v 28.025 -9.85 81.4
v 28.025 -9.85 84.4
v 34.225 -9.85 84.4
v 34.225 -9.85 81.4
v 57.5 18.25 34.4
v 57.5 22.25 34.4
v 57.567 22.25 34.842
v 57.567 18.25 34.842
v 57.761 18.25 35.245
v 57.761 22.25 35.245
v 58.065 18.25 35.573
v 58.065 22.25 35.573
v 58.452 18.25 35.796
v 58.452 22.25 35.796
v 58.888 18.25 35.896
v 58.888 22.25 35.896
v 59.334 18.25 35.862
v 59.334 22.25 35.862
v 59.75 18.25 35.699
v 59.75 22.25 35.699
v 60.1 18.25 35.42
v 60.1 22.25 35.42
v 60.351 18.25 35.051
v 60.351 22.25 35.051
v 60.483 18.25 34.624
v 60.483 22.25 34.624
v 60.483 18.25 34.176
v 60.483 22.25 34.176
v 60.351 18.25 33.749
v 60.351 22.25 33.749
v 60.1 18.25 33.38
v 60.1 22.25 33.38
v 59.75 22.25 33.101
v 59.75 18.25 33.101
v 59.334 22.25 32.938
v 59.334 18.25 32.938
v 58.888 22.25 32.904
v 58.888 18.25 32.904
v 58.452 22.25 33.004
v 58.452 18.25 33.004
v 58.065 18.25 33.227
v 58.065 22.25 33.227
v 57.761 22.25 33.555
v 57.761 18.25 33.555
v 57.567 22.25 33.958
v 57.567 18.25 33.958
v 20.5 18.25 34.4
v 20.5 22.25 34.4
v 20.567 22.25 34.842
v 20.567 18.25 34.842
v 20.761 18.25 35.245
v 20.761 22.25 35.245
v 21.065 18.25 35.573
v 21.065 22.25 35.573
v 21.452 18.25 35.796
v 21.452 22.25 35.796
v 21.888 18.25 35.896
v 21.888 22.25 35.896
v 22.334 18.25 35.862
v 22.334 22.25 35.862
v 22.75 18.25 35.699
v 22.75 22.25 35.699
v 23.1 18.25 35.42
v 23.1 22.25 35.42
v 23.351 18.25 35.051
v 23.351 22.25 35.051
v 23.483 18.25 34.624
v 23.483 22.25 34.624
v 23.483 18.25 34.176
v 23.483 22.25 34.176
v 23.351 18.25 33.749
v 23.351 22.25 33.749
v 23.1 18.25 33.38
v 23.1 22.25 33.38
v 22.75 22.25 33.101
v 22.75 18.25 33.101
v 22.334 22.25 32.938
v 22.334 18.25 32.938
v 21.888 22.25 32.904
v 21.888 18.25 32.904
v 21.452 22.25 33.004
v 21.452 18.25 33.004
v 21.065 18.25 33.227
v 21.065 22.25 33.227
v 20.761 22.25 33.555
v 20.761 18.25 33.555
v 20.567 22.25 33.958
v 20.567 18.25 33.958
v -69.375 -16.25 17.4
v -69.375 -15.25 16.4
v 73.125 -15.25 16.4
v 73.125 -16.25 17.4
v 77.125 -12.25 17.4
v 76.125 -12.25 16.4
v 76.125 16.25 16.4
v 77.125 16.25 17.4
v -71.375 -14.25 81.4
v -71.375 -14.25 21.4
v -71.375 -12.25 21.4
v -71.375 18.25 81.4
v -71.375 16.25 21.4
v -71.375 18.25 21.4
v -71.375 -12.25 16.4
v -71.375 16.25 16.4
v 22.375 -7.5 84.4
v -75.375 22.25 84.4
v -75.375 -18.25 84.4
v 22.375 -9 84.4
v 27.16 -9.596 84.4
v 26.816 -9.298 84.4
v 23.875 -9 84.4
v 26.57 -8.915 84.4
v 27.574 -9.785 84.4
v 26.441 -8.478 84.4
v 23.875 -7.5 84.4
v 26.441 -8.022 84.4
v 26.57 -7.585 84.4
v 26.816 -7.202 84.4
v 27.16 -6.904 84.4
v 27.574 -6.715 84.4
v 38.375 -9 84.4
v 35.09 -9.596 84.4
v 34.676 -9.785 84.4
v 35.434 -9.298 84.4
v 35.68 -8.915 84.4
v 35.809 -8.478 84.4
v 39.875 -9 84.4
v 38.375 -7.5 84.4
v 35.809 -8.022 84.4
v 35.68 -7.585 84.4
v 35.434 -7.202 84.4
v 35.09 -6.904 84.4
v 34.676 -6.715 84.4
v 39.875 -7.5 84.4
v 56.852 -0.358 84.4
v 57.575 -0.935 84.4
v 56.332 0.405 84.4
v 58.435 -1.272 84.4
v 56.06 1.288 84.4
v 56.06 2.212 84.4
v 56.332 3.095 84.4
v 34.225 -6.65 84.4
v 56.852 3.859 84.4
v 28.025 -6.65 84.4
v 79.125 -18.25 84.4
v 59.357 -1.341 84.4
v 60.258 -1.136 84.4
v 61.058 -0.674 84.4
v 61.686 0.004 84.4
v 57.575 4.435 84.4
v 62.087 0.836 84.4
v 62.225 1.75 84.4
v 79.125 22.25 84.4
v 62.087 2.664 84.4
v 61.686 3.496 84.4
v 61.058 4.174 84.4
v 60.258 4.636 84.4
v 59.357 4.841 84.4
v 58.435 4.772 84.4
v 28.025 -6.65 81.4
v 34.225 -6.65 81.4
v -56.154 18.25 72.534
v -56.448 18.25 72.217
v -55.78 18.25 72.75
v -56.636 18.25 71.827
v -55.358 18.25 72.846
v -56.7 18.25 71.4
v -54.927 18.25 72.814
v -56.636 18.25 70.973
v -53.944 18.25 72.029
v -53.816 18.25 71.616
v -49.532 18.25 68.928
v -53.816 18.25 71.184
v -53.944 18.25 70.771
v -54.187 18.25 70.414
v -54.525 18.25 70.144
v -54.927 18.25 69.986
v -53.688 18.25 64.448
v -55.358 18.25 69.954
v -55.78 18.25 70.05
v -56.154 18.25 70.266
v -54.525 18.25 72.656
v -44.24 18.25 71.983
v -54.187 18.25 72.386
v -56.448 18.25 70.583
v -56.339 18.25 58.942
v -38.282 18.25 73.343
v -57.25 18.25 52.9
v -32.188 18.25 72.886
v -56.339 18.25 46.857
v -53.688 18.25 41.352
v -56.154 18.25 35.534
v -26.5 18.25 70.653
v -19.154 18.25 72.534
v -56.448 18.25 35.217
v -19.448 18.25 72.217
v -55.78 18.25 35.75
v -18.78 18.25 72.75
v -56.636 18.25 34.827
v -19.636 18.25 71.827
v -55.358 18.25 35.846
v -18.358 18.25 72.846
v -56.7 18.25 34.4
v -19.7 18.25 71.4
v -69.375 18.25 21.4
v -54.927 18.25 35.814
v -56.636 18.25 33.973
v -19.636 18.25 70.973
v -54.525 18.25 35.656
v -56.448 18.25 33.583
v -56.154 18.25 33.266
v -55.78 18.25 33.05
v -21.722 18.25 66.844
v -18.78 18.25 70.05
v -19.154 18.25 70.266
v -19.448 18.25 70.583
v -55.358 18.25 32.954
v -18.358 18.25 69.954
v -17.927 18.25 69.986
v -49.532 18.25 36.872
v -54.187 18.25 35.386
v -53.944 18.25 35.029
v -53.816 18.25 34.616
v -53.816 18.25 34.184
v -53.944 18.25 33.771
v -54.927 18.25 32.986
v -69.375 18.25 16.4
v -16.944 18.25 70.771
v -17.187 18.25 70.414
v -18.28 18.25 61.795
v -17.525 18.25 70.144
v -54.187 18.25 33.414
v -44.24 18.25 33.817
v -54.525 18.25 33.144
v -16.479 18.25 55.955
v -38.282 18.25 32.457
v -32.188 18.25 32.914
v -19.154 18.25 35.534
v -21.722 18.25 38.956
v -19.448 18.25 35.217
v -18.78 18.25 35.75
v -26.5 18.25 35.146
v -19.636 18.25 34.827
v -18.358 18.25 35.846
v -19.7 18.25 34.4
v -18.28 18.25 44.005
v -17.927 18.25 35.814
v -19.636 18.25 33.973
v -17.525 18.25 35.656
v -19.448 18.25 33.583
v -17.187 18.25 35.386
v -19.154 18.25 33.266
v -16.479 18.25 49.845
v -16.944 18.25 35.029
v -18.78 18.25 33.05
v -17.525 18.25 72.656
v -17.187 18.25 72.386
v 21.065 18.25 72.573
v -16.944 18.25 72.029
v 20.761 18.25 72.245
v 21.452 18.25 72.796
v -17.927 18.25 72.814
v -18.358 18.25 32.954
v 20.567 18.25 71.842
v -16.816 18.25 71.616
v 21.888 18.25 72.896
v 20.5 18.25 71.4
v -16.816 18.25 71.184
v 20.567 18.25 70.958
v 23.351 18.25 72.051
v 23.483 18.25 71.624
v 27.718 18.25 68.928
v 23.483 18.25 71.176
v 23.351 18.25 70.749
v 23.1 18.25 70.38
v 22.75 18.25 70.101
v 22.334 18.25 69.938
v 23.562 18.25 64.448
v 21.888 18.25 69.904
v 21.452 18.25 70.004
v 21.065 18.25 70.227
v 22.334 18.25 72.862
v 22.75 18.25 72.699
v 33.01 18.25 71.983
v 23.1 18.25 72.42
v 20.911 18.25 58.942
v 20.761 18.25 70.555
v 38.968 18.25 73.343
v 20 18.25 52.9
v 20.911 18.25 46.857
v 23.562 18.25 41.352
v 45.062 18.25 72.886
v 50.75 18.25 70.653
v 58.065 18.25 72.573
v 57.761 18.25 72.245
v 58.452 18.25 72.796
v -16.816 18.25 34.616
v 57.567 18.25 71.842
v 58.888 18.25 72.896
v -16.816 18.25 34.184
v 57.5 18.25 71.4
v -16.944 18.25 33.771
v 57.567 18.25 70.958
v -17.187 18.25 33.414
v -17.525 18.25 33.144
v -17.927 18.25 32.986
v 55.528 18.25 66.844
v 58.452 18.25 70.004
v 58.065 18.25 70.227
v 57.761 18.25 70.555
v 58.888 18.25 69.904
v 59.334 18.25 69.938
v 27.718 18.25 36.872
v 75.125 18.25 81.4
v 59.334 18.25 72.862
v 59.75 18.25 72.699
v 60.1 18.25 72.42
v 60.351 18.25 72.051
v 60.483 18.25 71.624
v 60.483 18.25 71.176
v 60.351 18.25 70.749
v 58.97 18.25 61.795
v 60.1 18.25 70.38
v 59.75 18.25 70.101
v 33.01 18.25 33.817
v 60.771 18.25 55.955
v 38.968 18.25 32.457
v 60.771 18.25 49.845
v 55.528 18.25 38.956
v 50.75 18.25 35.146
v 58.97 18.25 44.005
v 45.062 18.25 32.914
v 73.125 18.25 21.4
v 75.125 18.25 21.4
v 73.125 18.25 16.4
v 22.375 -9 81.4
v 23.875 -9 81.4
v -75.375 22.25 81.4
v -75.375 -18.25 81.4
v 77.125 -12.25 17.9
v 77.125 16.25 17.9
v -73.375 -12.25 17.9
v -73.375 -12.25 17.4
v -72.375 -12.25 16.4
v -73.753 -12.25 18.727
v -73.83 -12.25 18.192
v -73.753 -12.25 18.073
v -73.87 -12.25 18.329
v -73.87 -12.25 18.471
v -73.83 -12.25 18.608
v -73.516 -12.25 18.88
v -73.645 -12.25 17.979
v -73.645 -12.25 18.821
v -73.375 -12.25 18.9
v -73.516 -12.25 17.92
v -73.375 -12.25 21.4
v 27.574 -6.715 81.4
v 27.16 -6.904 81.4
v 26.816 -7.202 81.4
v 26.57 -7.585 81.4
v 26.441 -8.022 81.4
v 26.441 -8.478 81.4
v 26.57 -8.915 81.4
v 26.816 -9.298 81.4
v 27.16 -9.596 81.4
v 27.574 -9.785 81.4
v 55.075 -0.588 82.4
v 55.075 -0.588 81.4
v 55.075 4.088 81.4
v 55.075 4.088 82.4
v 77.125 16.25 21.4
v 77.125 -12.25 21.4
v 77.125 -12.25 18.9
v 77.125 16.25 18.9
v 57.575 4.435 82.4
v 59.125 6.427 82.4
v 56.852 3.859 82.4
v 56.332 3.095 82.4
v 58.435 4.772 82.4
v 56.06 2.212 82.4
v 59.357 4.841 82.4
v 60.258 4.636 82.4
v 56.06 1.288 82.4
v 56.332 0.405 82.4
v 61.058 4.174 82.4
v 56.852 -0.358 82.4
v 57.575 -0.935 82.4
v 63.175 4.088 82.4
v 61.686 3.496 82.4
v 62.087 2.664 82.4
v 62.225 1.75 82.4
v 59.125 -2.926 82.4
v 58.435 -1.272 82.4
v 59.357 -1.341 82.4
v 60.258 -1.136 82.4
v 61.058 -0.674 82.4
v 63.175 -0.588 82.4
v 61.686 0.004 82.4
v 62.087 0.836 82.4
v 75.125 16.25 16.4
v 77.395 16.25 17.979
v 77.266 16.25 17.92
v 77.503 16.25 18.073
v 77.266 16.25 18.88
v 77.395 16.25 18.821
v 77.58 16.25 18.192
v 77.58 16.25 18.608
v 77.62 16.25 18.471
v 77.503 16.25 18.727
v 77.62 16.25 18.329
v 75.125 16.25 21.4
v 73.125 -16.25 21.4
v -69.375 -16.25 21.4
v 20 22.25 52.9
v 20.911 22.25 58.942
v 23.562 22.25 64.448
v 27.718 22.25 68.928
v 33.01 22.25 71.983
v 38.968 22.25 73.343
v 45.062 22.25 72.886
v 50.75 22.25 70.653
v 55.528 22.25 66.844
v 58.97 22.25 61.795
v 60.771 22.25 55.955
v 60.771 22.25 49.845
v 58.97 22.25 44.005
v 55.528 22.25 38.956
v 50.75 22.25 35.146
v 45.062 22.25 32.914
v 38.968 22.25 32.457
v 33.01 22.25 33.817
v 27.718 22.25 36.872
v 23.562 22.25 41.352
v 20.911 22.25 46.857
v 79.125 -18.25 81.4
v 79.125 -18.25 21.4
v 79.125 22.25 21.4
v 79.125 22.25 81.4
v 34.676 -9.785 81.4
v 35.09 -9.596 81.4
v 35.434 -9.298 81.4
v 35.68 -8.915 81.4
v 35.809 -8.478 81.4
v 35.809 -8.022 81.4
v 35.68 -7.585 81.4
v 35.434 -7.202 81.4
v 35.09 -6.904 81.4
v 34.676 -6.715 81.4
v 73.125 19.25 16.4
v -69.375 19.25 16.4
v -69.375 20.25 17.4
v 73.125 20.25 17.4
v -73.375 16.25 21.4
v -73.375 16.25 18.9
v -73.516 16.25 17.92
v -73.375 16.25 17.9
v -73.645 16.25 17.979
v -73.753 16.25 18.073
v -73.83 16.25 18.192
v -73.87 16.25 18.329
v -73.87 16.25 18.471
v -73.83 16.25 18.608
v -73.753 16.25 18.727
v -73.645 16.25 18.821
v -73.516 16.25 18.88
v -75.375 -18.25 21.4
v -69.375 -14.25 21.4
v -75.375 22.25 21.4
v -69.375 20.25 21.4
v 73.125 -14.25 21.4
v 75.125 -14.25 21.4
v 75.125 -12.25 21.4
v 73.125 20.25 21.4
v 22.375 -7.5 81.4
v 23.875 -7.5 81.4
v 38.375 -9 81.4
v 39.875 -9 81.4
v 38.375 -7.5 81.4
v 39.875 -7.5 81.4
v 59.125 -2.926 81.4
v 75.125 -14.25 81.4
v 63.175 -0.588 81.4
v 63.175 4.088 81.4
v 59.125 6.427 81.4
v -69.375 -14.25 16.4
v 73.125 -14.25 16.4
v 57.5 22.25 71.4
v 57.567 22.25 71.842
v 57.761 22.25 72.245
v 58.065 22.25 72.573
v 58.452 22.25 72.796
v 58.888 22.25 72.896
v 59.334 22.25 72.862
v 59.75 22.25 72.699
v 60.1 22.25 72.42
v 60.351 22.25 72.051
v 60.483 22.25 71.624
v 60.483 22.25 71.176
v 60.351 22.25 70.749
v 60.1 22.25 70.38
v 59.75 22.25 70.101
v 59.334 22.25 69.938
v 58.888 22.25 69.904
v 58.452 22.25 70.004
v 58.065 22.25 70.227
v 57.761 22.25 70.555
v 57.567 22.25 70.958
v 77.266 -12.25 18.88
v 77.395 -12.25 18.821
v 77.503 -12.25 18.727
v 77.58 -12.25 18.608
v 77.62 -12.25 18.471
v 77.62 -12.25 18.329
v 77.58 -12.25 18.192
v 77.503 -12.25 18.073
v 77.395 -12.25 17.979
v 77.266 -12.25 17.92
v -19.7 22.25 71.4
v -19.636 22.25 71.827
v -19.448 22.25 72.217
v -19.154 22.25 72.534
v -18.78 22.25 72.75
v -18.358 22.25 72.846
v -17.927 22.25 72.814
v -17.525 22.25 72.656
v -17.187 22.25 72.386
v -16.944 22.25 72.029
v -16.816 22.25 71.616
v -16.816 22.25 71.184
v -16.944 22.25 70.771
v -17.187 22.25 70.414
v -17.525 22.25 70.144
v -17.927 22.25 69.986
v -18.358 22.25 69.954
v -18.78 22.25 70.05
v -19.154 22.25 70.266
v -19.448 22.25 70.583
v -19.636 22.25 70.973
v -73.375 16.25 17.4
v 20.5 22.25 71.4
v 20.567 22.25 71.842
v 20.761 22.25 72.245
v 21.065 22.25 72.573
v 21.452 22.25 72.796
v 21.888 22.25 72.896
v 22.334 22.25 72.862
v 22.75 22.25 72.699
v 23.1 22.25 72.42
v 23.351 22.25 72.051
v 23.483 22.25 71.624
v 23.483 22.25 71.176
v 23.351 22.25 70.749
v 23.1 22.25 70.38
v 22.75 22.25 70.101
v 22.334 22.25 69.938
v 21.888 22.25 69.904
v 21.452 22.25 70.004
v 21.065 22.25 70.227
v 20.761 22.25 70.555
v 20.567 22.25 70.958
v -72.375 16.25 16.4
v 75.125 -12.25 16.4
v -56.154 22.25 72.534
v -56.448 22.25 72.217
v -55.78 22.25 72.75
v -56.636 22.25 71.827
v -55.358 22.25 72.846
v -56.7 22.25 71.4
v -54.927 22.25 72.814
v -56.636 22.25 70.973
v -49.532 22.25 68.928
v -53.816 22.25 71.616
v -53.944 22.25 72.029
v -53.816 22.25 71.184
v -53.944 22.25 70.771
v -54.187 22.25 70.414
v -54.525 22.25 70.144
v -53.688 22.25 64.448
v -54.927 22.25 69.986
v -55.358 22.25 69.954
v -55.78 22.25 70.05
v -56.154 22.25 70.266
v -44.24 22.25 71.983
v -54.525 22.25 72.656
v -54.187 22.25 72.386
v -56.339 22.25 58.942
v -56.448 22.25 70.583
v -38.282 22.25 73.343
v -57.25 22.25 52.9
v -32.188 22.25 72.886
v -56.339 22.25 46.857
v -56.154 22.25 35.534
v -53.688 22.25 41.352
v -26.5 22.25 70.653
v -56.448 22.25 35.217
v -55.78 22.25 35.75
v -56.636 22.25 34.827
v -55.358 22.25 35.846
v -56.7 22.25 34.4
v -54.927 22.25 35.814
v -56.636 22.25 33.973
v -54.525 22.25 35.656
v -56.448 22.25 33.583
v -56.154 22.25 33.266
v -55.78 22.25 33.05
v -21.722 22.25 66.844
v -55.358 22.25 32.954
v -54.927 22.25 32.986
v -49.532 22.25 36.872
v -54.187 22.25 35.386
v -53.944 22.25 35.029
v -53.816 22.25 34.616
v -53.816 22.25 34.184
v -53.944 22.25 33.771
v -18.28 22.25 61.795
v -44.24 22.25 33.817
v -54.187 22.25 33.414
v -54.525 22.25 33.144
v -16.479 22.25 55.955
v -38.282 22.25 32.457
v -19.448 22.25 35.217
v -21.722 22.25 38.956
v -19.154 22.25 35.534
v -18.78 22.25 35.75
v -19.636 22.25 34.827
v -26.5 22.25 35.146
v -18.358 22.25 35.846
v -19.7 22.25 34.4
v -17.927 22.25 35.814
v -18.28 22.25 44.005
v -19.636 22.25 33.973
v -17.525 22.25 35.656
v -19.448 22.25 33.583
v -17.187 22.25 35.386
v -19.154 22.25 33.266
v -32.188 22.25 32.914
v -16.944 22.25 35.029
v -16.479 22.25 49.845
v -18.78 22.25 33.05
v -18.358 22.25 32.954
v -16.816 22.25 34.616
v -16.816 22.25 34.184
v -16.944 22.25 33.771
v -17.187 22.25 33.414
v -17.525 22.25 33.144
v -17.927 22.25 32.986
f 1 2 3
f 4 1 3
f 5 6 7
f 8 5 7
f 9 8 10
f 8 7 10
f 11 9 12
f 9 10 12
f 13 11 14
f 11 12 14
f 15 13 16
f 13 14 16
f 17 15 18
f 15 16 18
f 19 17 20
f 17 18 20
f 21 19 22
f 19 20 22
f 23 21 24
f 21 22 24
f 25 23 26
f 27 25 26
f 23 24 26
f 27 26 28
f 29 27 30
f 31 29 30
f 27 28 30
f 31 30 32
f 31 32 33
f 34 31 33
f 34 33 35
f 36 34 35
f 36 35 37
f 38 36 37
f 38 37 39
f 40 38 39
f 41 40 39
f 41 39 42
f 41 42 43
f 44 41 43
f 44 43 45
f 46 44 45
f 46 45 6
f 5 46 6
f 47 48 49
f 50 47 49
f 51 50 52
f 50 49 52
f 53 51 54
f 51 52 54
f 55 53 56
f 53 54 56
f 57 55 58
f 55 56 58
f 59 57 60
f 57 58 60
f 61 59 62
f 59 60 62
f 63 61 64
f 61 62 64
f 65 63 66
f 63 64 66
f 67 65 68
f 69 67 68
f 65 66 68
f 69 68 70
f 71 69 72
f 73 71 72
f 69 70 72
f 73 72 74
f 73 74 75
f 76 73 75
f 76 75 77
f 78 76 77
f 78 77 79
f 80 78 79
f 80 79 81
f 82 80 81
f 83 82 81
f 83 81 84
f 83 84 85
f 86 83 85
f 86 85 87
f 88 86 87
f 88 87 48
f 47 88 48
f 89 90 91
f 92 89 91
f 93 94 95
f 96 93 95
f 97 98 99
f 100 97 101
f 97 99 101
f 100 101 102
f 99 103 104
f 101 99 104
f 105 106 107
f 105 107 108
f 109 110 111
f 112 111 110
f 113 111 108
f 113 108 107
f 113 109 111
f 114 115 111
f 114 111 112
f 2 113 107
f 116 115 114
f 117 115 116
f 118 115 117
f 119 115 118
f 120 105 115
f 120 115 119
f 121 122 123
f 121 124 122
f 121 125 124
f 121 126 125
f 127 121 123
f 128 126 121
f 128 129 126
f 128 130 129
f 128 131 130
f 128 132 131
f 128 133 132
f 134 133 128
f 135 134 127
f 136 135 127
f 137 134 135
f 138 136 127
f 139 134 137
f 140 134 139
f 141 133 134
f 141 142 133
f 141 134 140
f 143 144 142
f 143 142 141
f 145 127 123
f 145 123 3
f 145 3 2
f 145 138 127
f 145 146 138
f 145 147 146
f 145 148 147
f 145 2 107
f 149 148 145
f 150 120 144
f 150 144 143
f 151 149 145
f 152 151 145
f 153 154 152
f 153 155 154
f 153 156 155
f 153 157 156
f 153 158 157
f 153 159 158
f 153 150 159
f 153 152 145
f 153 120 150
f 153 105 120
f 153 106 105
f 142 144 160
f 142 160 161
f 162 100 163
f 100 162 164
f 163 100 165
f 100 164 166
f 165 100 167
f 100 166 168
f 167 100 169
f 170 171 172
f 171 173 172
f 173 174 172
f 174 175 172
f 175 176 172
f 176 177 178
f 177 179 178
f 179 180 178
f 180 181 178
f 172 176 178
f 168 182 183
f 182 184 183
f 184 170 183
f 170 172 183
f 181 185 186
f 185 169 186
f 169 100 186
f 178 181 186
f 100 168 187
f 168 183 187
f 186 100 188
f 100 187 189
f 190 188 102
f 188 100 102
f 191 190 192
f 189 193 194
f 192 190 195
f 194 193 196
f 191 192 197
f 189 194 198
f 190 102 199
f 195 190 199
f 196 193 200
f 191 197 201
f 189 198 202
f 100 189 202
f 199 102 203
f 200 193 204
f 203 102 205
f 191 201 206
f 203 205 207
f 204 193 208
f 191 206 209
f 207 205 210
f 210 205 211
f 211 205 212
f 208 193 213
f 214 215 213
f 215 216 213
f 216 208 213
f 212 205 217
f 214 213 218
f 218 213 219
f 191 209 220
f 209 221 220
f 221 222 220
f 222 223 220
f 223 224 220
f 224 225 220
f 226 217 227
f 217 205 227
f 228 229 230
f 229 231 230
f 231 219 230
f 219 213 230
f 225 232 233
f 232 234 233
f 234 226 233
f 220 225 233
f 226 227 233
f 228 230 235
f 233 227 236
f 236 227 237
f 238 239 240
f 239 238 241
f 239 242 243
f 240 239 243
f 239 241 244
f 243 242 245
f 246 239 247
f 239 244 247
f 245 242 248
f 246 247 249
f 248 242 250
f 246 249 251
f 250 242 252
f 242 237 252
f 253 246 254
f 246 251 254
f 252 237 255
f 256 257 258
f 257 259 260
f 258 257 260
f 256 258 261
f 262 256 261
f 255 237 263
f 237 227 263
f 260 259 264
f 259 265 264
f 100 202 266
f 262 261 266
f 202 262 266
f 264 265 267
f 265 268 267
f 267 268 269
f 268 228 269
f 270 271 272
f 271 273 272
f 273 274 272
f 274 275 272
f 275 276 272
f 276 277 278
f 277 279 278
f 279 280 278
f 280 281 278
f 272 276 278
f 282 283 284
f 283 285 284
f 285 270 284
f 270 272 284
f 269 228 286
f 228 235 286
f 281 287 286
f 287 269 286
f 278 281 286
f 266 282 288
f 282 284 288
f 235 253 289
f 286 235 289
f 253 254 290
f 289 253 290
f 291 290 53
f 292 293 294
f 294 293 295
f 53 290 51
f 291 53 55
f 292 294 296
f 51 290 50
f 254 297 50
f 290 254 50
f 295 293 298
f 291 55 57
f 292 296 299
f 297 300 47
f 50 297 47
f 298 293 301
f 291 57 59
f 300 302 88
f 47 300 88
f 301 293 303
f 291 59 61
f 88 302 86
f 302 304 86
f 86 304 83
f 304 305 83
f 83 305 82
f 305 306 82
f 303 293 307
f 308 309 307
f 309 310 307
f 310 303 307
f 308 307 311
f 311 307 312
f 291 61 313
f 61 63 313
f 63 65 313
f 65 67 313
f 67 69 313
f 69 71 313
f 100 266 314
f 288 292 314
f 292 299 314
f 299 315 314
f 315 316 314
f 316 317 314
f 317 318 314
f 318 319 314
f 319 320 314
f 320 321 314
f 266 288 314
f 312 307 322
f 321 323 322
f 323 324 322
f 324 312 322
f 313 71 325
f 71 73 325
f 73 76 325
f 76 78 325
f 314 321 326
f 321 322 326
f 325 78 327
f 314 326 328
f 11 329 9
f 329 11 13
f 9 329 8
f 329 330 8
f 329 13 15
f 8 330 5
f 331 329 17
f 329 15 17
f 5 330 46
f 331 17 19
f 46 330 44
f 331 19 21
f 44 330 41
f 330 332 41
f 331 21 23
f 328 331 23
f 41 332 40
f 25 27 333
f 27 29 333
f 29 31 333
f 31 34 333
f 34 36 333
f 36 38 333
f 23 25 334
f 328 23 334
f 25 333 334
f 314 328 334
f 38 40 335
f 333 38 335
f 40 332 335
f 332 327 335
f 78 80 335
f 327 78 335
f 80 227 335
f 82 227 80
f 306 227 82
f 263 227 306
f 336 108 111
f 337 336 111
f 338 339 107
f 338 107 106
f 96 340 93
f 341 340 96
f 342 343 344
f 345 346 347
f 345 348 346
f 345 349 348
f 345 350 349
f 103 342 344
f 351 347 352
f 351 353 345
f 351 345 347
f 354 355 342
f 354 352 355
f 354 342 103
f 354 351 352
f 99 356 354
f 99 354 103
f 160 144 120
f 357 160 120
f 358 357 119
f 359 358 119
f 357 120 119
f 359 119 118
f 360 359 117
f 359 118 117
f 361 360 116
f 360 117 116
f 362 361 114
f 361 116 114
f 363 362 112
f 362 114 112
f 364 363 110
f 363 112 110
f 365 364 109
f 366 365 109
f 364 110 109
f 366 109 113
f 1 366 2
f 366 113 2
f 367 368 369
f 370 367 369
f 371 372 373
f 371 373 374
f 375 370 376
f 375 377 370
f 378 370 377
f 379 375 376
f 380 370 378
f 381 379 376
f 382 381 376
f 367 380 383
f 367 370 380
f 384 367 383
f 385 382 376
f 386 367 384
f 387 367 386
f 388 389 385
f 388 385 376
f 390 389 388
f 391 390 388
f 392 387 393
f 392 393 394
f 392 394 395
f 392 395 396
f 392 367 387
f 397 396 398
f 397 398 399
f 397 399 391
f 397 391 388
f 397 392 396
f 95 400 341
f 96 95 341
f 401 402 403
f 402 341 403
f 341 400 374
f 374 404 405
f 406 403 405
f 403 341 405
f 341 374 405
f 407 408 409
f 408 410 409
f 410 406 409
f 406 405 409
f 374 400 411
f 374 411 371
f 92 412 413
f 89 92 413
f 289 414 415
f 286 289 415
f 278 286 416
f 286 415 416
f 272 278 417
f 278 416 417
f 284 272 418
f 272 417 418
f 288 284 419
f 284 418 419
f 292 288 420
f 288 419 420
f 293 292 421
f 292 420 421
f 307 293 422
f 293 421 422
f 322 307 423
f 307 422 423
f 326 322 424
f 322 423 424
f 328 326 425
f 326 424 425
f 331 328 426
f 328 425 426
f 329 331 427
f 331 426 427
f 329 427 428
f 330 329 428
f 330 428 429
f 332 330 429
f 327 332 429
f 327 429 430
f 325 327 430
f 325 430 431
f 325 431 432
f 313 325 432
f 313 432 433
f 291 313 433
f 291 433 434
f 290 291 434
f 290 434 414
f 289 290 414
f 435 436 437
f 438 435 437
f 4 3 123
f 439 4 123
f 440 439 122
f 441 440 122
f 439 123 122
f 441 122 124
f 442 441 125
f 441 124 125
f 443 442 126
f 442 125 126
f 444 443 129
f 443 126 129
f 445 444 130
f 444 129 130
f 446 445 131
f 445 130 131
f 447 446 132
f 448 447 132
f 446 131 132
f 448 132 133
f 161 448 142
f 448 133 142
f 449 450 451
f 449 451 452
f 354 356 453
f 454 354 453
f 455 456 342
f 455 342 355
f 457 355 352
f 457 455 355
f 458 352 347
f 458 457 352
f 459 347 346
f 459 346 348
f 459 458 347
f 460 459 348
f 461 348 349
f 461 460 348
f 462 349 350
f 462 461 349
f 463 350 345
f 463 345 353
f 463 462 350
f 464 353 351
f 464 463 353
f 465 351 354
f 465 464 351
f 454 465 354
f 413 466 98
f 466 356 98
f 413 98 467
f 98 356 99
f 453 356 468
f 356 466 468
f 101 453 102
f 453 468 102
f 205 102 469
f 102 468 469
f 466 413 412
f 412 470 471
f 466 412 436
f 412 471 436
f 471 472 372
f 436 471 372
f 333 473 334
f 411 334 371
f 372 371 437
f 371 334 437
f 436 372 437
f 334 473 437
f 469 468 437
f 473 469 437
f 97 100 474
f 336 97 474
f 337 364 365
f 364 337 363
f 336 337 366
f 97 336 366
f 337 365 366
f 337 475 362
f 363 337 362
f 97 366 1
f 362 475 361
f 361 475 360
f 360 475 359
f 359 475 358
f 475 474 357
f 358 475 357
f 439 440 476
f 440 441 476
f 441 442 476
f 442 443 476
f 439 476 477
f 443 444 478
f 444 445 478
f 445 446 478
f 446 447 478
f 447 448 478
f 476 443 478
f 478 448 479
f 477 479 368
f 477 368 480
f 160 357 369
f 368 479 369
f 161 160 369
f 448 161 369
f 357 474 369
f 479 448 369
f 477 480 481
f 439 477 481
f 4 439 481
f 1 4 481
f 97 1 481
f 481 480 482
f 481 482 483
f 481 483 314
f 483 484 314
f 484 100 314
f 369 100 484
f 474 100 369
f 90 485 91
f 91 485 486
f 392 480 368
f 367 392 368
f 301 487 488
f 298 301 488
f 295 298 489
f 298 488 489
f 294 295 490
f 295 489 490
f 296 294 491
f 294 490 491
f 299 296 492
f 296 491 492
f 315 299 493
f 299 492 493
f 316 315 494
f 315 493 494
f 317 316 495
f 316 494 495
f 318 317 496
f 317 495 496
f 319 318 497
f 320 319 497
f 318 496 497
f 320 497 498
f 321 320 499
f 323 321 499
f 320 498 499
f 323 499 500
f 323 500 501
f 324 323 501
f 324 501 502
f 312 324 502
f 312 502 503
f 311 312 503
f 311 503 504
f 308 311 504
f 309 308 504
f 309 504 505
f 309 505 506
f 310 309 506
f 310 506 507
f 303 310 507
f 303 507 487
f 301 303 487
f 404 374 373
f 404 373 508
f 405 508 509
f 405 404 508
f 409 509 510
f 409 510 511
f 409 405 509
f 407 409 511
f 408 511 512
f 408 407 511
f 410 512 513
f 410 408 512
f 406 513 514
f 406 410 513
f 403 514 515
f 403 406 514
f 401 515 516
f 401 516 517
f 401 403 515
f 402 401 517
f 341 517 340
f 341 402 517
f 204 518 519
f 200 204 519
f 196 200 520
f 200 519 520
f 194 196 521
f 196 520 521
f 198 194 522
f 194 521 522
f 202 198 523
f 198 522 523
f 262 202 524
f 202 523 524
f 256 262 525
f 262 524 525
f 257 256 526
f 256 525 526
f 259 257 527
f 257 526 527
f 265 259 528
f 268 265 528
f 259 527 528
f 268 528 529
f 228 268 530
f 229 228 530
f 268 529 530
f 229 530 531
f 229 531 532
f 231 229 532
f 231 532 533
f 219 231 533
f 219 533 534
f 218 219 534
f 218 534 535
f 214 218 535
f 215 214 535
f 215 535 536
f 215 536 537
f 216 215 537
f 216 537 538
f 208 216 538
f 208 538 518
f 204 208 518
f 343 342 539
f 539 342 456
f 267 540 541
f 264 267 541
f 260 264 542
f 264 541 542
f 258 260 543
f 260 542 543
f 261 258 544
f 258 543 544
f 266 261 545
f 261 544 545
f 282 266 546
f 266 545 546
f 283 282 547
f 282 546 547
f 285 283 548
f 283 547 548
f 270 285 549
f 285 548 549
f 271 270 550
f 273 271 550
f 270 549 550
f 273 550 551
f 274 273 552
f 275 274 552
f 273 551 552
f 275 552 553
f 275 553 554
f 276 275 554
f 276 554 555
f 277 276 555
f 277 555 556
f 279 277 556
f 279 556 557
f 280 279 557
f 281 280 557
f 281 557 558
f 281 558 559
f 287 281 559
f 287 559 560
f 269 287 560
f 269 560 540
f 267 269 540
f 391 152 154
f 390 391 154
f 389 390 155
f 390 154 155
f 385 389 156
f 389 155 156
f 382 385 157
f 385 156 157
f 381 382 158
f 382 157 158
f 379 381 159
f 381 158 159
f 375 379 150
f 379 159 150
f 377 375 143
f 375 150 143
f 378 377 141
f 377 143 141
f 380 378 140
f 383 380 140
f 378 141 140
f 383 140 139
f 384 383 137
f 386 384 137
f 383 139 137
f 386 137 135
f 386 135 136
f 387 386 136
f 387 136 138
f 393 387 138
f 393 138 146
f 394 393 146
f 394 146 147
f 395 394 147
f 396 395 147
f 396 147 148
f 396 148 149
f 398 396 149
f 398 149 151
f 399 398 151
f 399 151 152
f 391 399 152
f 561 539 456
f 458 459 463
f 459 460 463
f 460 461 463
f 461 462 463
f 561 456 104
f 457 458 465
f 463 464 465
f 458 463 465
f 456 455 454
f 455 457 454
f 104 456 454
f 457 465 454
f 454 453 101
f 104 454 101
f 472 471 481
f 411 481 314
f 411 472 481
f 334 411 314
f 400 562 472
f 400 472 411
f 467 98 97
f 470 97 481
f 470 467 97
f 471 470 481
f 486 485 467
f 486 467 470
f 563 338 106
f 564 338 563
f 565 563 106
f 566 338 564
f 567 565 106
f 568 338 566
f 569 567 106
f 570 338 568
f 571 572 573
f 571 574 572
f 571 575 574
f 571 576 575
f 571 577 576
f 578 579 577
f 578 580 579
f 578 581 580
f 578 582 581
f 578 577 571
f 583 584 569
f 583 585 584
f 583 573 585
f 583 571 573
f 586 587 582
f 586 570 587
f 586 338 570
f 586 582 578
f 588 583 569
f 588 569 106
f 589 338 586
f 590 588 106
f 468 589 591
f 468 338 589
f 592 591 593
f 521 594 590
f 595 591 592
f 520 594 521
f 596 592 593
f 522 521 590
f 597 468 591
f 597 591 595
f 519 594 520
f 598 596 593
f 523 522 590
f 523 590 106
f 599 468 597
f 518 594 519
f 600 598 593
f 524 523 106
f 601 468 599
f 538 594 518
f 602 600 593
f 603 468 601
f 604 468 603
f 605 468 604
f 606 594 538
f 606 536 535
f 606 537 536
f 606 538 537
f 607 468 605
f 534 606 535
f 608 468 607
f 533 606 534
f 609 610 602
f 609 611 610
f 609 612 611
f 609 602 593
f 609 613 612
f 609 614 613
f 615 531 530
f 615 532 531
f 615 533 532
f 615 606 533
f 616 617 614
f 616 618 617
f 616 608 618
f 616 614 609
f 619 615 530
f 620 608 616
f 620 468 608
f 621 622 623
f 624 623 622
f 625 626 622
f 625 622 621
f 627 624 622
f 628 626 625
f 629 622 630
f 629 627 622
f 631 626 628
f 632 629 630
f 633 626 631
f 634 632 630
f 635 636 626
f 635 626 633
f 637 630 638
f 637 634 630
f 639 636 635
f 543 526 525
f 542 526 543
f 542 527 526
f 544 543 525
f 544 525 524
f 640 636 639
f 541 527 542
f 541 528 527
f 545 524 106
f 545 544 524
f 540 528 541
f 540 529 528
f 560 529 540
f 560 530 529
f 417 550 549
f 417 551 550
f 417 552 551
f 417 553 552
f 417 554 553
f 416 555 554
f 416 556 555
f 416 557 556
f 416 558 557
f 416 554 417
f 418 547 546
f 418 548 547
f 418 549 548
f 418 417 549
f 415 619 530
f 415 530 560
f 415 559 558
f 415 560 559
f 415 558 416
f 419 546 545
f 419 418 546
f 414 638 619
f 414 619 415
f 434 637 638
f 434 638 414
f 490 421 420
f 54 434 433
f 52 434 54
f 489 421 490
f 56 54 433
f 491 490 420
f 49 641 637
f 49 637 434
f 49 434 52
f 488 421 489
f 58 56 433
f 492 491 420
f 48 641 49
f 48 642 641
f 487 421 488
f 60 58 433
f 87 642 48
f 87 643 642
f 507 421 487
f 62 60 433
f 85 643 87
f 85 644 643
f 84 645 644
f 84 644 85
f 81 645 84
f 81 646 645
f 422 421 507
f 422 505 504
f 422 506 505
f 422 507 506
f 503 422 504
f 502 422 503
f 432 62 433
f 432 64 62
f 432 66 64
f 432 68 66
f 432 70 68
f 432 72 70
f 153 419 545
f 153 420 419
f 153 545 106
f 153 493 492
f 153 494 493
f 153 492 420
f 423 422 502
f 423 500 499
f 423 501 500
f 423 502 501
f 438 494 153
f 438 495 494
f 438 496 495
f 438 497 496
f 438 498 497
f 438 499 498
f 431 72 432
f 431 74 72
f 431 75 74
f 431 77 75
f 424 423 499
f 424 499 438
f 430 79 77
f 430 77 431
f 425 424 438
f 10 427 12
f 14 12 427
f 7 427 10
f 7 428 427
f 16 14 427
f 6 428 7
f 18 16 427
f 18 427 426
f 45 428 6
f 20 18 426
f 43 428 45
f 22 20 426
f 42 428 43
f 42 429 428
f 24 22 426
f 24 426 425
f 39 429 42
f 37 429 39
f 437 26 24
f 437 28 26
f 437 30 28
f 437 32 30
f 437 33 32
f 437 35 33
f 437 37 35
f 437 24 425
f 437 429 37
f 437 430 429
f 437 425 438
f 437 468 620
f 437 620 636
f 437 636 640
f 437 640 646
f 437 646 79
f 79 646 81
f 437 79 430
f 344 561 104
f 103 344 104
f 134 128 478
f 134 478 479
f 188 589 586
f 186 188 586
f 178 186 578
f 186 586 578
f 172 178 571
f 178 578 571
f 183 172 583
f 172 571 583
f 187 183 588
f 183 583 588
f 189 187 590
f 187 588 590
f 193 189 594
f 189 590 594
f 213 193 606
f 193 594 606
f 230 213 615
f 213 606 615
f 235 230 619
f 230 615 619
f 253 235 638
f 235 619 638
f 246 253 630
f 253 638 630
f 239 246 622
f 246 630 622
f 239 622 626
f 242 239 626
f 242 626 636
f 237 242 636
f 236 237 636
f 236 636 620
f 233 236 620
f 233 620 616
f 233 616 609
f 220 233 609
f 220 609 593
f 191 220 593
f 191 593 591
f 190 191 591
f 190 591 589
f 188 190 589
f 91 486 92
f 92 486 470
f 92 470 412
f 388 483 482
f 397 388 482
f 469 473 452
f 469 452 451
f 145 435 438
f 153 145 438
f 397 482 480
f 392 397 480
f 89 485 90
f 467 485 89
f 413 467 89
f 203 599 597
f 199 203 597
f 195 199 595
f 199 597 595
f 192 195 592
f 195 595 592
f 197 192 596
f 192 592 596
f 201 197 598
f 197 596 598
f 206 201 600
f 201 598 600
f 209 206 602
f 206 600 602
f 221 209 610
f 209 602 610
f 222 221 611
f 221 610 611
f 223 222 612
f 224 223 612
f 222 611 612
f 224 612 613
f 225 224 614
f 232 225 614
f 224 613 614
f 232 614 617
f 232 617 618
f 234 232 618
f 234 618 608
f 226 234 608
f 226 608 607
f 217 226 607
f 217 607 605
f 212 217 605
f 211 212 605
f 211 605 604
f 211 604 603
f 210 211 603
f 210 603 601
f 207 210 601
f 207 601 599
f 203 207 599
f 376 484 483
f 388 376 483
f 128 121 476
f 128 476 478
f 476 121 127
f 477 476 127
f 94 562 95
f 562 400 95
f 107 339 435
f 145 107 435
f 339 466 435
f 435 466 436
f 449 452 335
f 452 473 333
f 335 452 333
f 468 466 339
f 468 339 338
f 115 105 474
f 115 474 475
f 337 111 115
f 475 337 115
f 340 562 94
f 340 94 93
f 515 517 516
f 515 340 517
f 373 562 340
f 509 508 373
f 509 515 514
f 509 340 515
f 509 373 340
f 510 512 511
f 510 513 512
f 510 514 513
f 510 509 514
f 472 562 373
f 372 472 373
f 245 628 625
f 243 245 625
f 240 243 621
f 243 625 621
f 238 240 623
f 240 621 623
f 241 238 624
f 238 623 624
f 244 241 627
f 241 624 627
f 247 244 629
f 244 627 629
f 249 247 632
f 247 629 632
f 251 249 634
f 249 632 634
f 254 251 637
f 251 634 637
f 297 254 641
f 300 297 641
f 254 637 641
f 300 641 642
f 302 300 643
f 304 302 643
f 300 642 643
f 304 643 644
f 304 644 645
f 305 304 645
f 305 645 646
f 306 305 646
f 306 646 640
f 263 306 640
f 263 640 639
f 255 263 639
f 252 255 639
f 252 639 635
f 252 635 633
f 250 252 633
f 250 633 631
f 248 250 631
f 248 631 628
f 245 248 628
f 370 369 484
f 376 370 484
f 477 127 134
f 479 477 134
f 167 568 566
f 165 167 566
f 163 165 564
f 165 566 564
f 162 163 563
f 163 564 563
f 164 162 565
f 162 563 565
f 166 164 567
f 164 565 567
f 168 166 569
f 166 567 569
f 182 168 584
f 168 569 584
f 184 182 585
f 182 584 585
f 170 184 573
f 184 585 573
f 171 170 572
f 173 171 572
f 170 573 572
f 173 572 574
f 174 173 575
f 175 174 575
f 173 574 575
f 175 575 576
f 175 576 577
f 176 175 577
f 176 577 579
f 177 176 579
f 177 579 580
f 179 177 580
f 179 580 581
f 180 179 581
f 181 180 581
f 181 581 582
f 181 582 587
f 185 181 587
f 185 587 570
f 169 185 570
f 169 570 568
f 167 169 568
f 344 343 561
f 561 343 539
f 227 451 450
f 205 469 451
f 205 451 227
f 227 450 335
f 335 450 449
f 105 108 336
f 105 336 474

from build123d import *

# Parameters (mm, degrees)
SKETCH021_W     = 150.5
SKETCH021_H     = 36.5
SKETCH021_W_2   = 146.5
SKETCH021_H_2   = 32.5
PAD010_DEPTH    = 5
SKETCH022_W     = 154.5
SKETCH022_H     = 40.5
SKETCH022_W_2   = 146.5
SKETCH022_H_2   = 32.5
PAD011_DEPTH    = 60
SKETCH026_R     = 0.5
PAD013_DEPTH    = 36.5
SKETCH027_W     = 6
SKETCH027_H     = 6
POCKET008_DEPTH = 15
CHAMFER002_SIZE = 1
SKETCH028_W     = 154.5
SKETCH028_H     = 40.5
PAD014_DEPTH    = 3
SKETCH029_R     = 3.1
POCKET009_DEPTH = 5
POCKET010_DEPTH = 1
SKETCH031_W     = 1.5
SKETCH031_H     = 1.5
POCKET011_DEPTH = 5
SKETCH032_R     = 20.5
SKETCH032_R_2   = 1.45
SKETCH032_R_3   = 1.5
POCKET012_DEPTH = 5


with BuildPart() as part:
    # Sketch021 (on DatumPlane) → Pad010 (new body)
    with BuildSketch(Plane.XY.offset(21.399978)):
        with Locations((1.87496, 2.00006)):
            Rectangle(SKETCH021_W, SKETCH021_H)
        with Locations((1.87496, 2.00006)):
            Rectangle(SKETCH021_W_2, SKETCH021_H_2, mode=Mode.SUBTRACT)
    extrude(amount=-PAD010_DEPTH)

    # Sketch022 (on DatumPlane) → Pad011 (join)
    with BuildSketch(Plane.XY.offset(21.399978)):
        with Locations((1.87496, 2.00006)):
            Rectangle(SKETCH022_W, SKETCH022_H)
        with Locations((1.87496, 2.00006)):
            Rectangle(SKETCH022_W_2, SKETCH022_H_2, mode=Mode.SUBTRACT)
    extrude(amount=PAD011_DEPTH)

    # Sketch026 (on Face2 of Pad011) → Pad013 (join)
    with BuildSketch(Plane(origin=(0, 20.25006, 21.399978), x_dir=(-1, 0, 0), z_dir=(0, 1, 0))):
        with Locations((73.375041, -3)):
            Circle(SKETCH026_R)
        with Locations((-77.124959, -3)):
            Circle(SKETCH026_R)
    extrude(amount=-PAD013_DEPTH)

    # Sketch027 (on Face6 of Pad013) → Pocket008 (cut)
    with BuildSketch(Plane(origin=(0, 0, 21.399978), x_dir=(1, 0, 0), z_dir=(0, 0, -1))):
        with Locations((-72.375041, 15.24994)):
            Rectangle(SKETCH027_W, SKETCH027_H)
        with Locations((-72.375041, -19.25006)):
            Rectangle(SKETCH027_W, SKETCH027_H)
        with Locations((76.124959, 15.24994)):
            Rectangle(SKETCH027_W, SKETCH027_H)
        with Locations((76.124959, -19.25006)):
            Rectangle(SKETCH027_W, SKETCH027_H)
    extrude(amount=POCKET008_DEPTH, mode=Mode.SUBTRACT)

    # Chamfer002
    chamfer002_edges = [part.edges().sort_by_distance(p)[0] for p in [
        (1.87496, 20.25006, 16.399978),
        (-73.37504, 2.00006, 16.399978),
        (1.87496, -16.24994, 16.399978),
        (77.12496, 2.00006, 16.399978),
    ]]
    chamfer(chamfer002_edges, length=CHAMFER002_SIZE)

    # Sketch028 (on Face11 of Chamfer002) → Pad014 (join)
    with BuildSketch(Plane.XY.offset(81.399978)):
        with Locations((1.874959, 2.00006)):
            Rectangle(SKETCH028_W, SKETCH028_H)
    extrude(amount=PAD014_DEPTH)

    # Sketch029 (on Face32 of Pad014) → Pocket009 (cut)
    with BuildSketch(Plane.XY.offset(84.399978)):
        with Locations((59.124959, 1.75006)):
            Circle(SKETCH029_R)
    extrude(amount=-POCKET009_DEPTH, mode=Mode.SUBTRACT)

    # Sketch030 (on Face11 of Pocket009) → Pocket010 (cut)
    with BuildSketch(Plane(origin=(0, 0, 81.399978), x_dir=(1, 0, 0), z_dir=(0, 0, -1))):
        Polygon((59.12496, 2.926477), (55.07496, 0.588209), (55.07496, -4.088329), (59.12496, -6.426597), (63.17496, -4.088329), (63.17496, 0.588209), align=None)
    extrude(amount=-POCKET010_DEPTH, mode=Mode.SUBTRACT)

    # Sketch031 (on Face35 of Pocket010) → Pocket011 (cut)
    with BuildSketch(Plane.XY.offset(84.399978)):
        with BuildLine():
            ThreePointArc((28.024959, -6.64994), (26.424959, -8.24994), (28.024959, -9.84994))
            Line((28.024959, -9.84994), (34.224959, -9.84994))
            ThreePointArc((34.224959, -9.84994), (35.824959, -8.24994), (34.224959, -6.64994))
            Line((28.024959, -6.64994), (34.224959, -6.64994))
        make_face()
        with Locations((23.124959, -8.24994)):
            Rectangle(SKETCH031_W, SKETCH031_H)
        with Locations((39.124959, -8.24994)):
            Rectangle(SKETCH031_W, SKETCH031_H)
    extrude(amount=-POCKET011_DEPTH, mode=Mode.SUBTRACT)

    # Sketch032 (on Face13 of Pocket011) → Pocket012 (cut)
    with BuildSketch(Plane(origin=(0, 22.25006, 21.399978), x_dir=(-1, 0, 0), z_dir=(0, 1, 0))):
        with Locations((36.75004, 31.5)):
            Circle(SKETCH032_R)
        with Locations((18.25004, 50)):
            Circle(SKETCH032_R_2)
        with Locations((55.25004, 50)):
            Circle(SKETCH032_R_2)
        with Locations((55.25004, 13)):
            Circle(SKETCH032_R_2)
        with Locations((18.25004, 13)):
            Circle(SKETCH032_R_2)
        with Locations((-40.49996, 31.5)):
            Circle(SKETCH032_R)
        with Locations((-58.99996, 50)):
            Circle(SKETCH032_R_3)
        with Locations((-21.99996, 50)):
            Circle(SKETCH032_R_3)
        with Locations((-21.99996, 13)):
            Circle(SKETCH032_R_3)
        with Locations((-58.99996, 13)):
            Circle(SKETCH032_R_3)
    extrude(amount=-POCKET012_DEPTH, mode=Mode.SUBTRACT)


solid = part.part
